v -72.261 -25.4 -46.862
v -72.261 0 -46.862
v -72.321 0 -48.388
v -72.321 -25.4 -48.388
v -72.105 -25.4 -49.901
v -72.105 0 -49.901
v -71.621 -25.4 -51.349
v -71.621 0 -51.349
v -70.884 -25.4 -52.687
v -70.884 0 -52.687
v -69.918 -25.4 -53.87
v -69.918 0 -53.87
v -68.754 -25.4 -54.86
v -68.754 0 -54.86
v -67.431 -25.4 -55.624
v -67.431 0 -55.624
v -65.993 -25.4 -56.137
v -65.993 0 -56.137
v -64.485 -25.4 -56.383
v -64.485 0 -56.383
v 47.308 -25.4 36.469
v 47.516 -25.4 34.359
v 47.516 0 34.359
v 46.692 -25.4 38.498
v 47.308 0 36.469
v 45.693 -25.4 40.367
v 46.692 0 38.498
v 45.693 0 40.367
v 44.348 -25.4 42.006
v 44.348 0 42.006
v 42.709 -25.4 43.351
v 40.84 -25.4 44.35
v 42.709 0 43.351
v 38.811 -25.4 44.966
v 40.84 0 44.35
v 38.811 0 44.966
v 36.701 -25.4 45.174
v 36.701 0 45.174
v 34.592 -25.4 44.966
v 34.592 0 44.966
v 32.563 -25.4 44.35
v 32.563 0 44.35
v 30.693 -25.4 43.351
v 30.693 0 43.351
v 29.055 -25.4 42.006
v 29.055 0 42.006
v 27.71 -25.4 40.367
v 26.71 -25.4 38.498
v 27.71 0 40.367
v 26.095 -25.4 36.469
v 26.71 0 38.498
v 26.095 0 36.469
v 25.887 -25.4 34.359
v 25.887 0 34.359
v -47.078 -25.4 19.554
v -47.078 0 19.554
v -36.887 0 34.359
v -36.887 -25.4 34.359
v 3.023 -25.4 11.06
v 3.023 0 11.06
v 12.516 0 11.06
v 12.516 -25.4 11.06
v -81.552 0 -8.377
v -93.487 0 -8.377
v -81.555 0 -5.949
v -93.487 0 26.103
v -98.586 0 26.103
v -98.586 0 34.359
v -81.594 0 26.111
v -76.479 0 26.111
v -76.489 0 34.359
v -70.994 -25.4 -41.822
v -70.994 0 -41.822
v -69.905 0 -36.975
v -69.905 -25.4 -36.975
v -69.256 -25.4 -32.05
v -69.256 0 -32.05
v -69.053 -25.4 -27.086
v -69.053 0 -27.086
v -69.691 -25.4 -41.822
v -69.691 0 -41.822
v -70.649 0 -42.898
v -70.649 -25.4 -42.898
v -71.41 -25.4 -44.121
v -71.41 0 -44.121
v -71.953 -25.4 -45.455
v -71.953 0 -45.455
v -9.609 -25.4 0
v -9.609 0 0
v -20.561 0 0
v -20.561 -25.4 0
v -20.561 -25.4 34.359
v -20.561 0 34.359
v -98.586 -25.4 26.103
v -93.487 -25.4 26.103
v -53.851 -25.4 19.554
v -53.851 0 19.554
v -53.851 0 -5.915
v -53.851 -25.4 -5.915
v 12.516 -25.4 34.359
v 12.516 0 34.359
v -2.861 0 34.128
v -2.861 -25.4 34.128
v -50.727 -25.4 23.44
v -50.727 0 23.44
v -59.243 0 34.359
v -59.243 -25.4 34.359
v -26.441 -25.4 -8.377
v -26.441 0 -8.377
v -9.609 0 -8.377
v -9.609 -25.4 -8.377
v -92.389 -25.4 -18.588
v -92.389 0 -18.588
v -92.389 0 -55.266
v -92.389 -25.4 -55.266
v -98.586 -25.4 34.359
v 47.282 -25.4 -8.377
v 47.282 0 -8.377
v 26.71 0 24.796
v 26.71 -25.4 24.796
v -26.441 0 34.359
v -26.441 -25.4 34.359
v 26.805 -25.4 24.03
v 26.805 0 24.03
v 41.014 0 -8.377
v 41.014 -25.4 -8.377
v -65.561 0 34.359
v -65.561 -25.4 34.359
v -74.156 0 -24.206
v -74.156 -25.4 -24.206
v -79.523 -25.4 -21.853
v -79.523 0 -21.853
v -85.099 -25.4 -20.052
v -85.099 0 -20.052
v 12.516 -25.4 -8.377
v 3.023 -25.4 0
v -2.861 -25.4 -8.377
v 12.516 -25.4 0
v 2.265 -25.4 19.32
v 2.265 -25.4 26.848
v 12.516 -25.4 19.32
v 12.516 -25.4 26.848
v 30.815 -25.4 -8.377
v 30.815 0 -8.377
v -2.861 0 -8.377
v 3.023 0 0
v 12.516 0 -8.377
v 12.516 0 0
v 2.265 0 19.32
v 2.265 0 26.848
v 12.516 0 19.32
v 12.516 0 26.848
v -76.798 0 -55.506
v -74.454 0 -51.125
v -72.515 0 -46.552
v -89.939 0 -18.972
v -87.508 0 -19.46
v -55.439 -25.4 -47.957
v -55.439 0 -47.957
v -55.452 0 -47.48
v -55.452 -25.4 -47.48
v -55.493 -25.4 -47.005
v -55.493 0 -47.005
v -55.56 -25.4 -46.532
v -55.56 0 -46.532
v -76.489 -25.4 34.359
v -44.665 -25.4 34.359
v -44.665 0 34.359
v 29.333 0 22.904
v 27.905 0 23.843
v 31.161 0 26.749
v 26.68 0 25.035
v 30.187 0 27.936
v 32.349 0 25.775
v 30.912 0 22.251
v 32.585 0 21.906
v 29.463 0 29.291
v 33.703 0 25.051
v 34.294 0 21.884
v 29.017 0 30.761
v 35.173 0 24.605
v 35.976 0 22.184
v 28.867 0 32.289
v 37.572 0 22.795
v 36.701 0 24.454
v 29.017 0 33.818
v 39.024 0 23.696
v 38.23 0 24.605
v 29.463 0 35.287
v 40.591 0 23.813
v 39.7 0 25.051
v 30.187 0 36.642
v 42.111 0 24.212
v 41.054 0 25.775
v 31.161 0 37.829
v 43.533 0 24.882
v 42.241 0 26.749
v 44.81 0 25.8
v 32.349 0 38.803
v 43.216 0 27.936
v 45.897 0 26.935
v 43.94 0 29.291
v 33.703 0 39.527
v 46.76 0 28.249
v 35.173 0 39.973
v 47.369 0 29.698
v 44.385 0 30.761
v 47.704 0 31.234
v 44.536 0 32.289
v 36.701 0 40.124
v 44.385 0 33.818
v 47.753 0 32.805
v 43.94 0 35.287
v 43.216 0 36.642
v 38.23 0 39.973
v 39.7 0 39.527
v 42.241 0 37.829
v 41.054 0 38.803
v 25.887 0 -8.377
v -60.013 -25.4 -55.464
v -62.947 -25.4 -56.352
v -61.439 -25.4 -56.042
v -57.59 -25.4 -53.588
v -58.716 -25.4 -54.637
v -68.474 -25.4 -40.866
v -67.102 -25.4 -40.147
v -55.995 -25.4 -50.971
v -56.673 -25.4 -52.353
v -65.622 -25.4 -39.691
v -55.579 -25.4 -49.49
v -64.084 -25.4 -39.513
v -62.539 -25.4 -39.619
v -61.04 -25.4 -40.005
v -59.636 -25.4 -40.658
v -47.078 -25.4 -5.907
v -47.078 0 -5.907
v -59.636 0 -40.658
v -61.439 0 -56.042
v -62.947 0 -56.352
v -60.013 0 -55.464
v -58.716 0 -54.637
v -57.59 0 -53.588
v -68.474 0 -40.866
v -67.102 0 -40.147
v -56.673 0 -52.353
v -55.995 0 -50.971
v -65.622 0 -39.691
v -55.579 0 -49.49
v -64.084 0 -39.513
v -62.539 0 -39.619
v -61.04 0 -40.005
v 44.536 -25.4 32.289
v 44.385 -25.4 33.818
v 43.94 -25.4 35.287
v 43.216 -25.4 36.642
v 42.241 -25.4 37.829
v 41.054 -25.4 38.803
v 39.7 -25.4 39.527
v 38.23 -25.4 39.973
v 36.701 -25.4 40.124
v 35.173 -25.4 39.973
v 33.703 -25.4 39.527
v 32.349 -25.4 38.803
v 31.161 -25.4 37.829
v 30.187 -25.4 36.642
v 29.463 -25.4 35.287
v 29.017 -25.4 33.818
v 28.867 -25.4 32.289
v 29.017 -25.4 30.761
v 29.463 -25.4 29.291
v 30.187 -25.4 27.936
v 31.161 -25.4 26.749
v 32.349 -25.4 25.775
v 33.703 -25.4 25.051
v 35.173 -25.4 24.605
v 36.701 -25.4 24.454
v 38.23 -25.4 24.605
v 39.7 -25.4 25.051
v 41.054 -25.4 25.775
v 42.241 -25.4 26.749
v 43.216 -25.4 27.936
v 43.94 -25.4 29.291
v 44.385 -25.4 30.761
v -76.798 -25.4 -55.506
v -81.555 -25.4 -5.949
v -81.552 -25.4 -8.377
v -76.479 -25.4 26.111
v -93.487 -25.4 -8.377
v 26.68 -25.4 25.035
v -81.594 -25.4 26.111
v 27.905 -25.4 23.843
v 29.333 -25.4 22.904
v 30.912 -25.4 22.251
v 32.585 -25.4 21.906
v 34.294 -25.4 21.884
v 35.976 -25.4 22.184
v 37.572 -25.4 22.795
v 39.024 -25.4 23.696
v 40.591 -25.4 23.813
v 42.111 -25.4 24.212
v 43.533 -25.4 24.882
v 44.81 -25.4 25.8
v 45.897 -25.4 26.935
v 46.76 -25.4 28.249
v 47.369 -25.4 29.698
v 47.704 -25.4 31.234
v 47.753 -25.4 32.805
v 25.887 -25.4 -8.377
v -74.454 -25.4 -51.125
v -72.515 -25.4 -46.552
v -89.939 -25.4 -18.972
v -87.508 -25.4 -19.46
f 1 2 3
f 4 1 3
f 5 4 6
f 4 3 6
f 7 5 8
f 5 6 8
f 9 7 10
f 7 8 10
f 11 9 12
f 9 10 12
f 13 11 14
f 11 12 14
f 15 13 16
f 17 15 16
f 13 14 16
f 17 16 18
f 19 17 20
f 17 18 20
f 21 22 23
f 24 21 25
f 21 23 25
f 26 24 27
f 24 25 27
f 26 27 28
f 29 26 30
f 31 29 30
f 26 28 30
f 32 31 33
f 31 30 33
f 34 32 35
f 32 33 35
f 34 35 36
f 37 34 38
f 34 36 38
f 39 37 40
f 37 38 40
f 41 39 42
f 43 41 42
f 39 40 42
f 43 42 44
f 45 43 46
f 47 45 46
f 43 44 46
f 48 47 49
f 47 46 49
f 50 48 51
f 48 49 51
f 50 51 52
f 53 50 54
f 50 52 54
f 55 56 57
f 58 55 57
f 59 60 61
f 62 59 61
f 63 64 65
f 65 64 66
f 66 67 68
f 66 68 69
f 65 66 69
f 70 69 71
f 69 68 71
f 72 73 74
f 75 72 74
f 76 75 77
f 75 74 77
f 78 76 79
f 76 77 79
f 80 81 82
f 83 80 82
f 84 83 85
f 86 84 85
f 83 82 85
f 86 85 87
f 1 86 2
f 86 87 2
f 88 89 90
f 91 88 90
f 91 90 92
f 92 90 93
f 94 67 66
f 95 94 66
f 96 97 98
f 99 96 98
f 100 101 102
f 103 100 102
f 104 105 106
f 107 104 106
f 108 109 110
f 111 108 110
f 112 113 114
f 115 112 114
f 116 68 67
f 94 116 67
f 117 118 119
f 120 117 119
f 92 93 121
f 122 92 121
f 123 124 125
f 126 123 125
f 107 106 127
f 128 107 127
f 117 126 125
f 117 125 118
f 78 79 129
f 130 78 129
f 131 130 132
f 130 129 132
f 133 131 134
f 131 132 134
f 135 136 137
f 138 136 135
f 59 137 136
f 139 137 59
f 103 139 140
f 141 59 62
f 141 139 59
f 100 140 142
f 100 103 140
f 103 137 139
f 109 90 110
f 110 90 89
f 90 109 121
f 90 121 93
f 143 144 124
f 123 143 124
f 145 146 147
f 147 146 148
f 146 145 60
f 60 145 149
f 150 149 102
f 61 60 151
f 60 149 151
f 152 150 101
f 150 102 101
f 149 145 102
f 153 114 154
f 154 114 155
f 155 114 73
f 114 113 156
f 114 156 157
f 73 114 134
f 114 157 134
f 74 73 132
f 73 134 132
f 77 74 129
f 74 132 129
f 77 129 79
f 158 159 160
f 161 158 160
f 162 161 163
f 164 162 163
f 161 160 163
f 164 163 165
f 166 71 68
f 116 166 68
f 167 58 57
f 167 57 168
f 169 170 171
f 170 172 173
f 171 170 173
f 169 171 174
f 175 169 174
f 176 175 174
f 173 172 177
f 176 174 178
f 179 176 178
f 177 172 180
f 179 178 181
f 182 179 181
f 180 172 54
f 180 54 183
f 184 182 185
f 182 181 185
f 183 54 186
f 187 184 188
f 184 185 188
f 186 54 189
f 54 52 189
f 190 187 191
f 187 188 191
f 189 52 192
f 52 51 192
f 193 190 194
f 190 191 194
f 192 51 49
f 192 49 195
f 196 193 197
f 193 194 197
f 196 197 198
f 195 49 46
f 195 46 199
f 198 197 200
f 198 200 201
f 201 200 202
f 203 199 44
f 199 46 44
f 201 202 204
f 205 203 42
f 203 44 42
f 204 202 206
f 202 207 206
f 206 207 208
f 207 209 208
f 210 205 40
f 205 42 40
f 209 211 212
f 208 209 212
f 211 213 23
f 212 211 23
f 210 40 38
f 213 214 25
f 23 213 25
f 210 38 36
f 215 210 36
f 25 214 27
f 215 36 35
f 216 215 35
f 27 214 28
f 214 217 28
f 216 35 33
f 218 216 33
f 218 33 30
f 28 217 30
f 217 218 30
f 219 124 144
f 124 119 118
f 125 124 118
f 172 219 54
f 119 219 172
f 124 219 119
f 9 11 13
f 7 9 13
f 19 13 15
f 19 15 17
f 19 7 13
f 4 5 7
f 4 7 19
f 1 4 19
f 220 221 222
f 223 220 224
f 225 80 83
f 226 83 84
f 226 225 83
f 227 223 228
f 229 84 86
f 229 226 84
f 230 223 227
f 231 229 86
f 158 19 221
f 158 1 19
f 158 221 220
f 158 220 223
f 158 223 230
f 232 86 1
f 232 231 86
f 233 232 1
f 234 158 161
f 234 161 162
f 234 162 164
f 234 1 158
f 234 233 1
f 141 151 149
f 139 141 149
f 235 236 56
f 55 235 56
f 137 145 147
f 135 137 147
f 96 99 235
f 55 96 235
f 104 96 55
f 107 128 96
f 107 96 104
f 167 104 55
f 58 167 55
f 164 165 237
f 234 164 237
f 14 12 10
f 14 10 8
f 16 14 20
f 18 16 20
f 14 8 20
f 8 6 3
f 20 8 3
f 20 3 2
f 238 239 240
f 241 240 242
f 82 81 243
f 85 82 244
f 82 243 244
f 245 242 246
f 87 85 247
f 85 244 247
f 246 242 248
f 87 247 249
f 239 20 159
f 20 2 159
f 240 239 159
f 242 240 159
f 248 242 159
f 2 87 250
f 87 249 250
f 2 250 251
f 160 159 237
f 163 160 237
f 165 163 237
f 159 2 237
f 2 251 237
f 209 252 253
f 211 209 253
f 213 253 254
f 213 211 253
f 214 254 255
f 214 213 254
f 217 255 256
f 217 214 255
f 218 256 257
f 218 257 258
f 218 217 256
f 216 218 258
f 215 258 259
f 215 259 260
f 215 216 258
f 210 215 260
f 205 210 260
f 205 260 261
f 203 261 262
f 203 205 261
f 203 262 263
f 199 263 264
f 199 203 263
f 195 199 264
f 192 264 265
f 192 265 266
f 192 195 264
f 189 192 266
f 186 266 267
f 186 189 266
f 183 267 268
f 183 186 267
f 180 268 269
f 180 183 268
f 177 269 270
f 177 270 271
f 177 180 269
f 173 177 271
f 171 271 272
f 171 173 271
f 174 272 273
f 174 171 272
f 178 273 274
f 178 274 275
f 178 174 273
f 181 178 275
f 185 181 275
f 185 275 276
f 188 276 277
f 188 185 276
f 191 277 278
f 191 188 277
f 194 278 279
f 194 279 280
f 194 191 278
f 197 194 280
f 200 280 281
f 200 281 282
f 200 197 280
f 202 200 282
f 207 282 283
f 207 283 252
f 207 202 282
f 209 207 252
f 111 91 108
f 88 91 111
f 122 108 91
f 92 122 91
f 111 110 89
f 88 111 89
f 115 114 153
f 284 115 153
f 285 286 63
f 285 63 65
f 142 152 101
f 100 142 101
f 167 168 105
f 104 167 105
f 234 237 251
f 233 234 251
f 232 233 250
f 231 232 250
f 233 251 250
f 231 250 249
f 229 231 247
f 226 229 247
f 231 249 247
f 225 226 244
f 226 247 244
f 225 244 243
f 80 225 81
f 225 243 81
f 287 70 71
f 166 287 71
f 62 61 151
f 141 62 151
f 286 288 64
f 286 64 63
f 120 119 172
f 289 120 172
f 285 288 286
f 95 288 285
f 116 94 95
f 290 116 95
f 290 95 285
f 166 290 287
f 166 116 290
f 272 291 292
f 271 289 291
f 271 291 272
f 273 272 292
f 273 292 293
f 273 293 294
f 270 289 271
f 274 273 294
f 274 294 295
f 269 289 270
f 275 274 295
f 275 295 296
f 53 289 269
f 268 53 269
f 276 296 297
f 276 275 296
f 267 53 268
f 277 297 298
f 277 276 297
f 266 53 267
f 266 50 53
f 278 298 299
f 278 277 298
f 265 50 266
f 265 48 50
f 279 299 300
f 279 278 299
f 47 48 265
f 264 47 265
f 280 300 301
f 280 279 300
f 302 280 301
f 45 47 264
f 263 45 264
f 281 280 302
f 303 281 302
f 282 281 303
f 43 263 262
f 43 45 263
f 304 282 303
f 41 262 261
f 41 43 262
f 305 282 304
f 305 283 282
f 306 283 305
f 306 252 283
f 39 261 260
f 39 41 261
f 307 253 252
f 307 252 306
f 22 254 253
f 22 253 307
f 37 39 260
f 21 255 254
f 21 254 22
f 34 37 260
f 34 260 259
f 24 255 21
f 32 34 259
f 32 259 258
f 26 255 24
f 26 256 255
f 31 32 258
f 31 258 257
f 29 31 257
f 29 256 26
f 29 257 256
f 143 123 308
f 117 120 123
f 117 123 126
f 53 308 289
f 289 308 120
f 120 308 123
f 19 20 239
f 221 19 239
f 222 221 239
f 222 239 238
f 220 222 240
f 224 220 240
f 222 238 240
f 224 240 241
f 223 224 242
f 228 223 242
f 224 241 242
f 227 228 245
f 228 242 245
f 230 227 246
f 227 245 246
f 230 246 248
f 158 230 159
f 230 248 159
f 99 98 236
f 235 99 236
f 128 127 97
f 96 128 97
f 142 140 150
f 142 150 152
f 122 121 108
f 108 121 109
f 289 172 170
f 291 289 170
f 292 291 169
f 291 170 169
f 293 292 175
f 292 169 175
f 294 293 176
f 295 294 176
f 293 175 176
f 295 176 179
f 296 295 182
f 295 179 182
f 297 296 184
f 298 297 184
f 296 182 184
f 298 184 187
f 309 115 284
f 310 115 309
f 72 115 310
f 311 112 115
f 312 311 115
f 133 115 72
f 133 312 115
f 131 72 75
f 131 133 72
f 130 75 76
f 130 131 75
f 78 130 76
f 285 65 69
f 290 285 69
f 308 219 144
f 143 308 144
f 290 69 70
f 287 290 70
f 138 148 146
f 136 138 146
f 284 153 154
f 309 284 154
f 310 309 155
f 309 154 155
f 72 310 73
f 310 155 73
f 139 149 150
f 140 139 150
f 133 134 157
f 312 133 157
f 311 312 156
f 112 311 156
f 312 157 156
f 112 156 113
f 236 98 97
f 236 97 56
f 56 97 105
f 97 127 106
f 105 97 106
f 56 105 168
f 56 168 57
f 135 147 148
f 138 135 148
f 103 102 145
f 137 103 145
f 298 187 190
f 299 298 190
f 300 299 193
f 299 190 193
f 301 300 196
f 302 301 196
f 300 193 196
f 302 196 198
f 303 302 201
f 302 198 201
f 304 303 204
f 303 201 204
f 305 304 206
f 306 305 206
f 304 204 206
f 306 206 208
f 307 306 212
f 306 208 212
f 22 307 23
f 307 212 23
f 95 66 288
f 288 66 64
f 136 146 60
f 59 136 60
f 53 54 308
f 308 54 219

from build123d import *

# Parameters (mm, degrees)
F1_DEPTH = 25.4
F0_R     = 7.8346511006
F2_DEPTH = 25.4


# Not quite as in the source:
# - a feature names something its author has since deleted; it is built from what else it names


with BuildPart() as f1:
    # F0 (on Front) → F1 (new body)
    with BuildSketch(Plane.XZ):
        Polygon((-81.5548015942, -5.9490810307), (-81.5939936003, 26.1106837792), (-76.4789922628, 26.1106837792), (-76.4890760183, 34.3593768775), (-98.5859185457, 34.3593768775), (-98.5859185457, 26.1034145951), (-93.4866443276, 26.1034145951), (-93.4866443276, -8.3773750812), (-85.1137137568, -8.3773750812), (-81.5518330847, -8.3773750812), align=None)
    extrude(amount=F1_DEPTH)


with BuildPart() as f1b:
    # F0 (on Front) → F1, piece 2 (new body)
    with BuildSketch(Plane.XZ):
        Polygon((-53.8510866463, 19.5539519191), (-53.8510866463, -5.915214152), (-47.0775440335, -5.9069337194), (-47.0775440335, 19.5539519191), (-36.8871465325, 34.3593768775), (-44.6654930711, 34.3593768775), (-50.7271438837, 23.4395619482), (-59.2428706586, 34.3593768775), (-65.5611678958, 34.3593768775), align=None)
    extrude(amount=F1_DEPTH)


with BuildPart() as f1c:
    # F0 (on Front) → F1, piece 3 (new body)
    with BuildSketch(Plane.XZ):
        Polygon((-26.4410860837, 34.3593768775), (-26.4410860837, -5.8817063295), (-9.6088461578, -5.8611294708), (-9.6088461578, 0), (-20.5608587712, 0), (-20.5608587712, 34.3593768775), align=None)
        Polygon((-9.6088461578, -5.8611294708), (-26.4410860837, -5.8817063295), (-26.4410860837, -8.3773750812), (-9.6088461578, -8.3773750812), align=None)
    extrude(amount=F1_DEPTH)


with BuildPart() as f1d:
    # F0 (on Front) → F1, piece 4 (new body)
    with BuildSketch(Plane.XZ):
        Polygon((-2.8605444822, 34.1275193292), (-2.8605444822, -5.8528798943), (-2.8605444822, -8.3773750812), (12.5163393095, -8.3773750812), (12.5163393095, 0), (3.0234002043, 0), (3.0234002043, 11.0600087792), (12.5163393095, 11.0600087792), (12.5163393095, 19.3200614303), (2.2653094493, 19.3200614303), (2.2653094493, 26.8484186381), (12.5163393095, 26.8484186381), (12.5163393095, 34.3593768775), align=None)
    extrude(amount=F1_DEPTH)


with BuildPart() as f1e:
    # F0 (on Front) → F1, piece 5 (new body)
    with BuildSketch(Plane.XZ):
        Polygon((25.887073949, -5.817736878), (25.887073949, -8.3773750812), (30.8153238147, -8.3773750812), (26.804734222, 24.0303265492), (25.887073949, 26.1232946068), align=None)
        Polygon((41.013866663, -8.3773750812), (47.2822114825, -8.3773750812), (26.7099292009, 24.7964016527), (26.804734222, 24.0303265492), align=None)
        with BuildLine():
            Line((25.887073949, 31.4455106854), (25.887073949, 26.1232946068))
            ThreePointArc((25.887073949, 26.1232946068), (26.2634233094, 25.5641583421), (26.6804434798, 25.0346619955))
            Line((26.6804434798, 25.0346619955), (25.887073949, 31.4455106854))
        make_face()
        with BuildLine():
            Line((25.887073949, 31.4455106854), (26.6804434798, 25.0346619955))
            ThreePointArc((26.6804434798, 25.0346619955), (32.5853799721, 21.9064737064), (39.0235707164, 23.6963164061))
            ThreePointArc((39.0235707164, 23.6963164061), (45.8972704971, 26.9351735913), (47.5156493485, 34.3593768775))
            ThreePointArc((47.5156493485, 34.3593768775), (36.7013616487, 45.1736645773), (25.887073949, 34.3593768775))
            Line((25.887073949, 34.3593768775), (25.887073949, 31.4455106854))
        make_face()
        with Locations((36.7013616487, 32.2891227819)):
            Circle(F0_R, mode=Mode.SUBTRACT)
        with BuildLine():
            Line((25.887073949, 26.1232946068), (26.7099292009, 24.7964016527))
            Line((26.7099292009, 24.7964016527), (26.6804434798, 25.0346619955))
            ThreePointArc((26.6804434798, 25.0346619955), (26.2634233094, 25.5641583421), (25.887073949, 26.1232946068))
        make_face()
        Polygon((26.804734222, 24.0303265492), (26.7099292009, 24.7964016527), (25.887073949, 26.1232946068), align=None)
    extrude(amount=F1_DEPTH)


with BuildPart() as f1f:
    # F0 (on Front) → F1, piece 6 (new body)
    with BuildSketch(Plane.XZ):
        with BuildLine():
            ThreePointArc((-69.052644074, -27.0859580487), (-76.8098655757, -22.9616357633), (-85.0994422189, -20.0517493705))
            ThreePointArc((-85.0994422189, -20.0517493705), (-88.7208301281, -19.2034415659), (-92.3890024424, -18.5881461948))
            Line((-92.3890024424, -18.5881461948), (-92.3890024424, -55.2658587694))
            Line((-92.3890024424, -55.2658587694), (-76.7976269126, -55.5061623454))
            ThreePointArc((-76.7976269126, -55.5061623454), (-73.4330277562, -48.8605222286), (-70.9939883224, -41.8223302246))
            ThreePointArc((-70.9939883224, -41.8223302246), (-69.5249399969, -34.5197993576), (-69.052644074, -27.0859580487))
        make_face()
    extrude(amount=F1_DEPTH)


with BuildPart() as f1g:
    # F0 (on Front) → F1, piece 7 (new body)
    with BuildSketch(Plane.XZ):
        with BuildLine():
            Line((-70.9939883224, -44.3777080037), (-69.6910760743, -41.8223302246))
            ThreePointArc((-69.6910760743, -41.8223302246), (-71.4103560372, -44.1206987553), (-72.2607105289, -46.8621069212))
            Line((-72.2607105289, -46.8621069212), (-70.9939883224, -44.3777080037))
        make_face()
    extrude(amount=F1_DEPTH)

    # F0 (on Front) → F2 (join)
    with BuildSketch(Plane.XZ):
        with BuildLine():
            Line((-55.5599836481, -46.5320129656), (-59.6358900865, -40.6576858918))
            ThreePointArc((-59.6358900865, -40.6576858918), (-64.8572673415, -39.5669335136), (-69.6910760743, -41.8223302246))
            Line((-69.6910760743, -41.8223302246), (-70.9939883224, -44.3777080037))
            Line((-70.9939883224, -44.3777080037), (-72.2607105289, -46.8621069212))
            ThreePointArc((-72.2607105289, -46.8621069212), (-70.4274922661, -53.3003248587), (-64.4852485065, -56.3827068131))
            ThreePointArc((-64.4852485065, -56.3827068131), (-58.1287611445, -54.1385093801), (-55.4388398996, -47.9574352503))
            ThreePointArc((-55.4388398996, -47.9574352503), (-55.4691803286, -47.2421547987), (-55.5599836481, -46.5320129656))
        make_face()
    extrude(amount=F2_DEPTH)


solid = Compound([f1.part, f1b.part, f1c.part, f1d.part, f1e.part, f1f.part, f1g.part])
